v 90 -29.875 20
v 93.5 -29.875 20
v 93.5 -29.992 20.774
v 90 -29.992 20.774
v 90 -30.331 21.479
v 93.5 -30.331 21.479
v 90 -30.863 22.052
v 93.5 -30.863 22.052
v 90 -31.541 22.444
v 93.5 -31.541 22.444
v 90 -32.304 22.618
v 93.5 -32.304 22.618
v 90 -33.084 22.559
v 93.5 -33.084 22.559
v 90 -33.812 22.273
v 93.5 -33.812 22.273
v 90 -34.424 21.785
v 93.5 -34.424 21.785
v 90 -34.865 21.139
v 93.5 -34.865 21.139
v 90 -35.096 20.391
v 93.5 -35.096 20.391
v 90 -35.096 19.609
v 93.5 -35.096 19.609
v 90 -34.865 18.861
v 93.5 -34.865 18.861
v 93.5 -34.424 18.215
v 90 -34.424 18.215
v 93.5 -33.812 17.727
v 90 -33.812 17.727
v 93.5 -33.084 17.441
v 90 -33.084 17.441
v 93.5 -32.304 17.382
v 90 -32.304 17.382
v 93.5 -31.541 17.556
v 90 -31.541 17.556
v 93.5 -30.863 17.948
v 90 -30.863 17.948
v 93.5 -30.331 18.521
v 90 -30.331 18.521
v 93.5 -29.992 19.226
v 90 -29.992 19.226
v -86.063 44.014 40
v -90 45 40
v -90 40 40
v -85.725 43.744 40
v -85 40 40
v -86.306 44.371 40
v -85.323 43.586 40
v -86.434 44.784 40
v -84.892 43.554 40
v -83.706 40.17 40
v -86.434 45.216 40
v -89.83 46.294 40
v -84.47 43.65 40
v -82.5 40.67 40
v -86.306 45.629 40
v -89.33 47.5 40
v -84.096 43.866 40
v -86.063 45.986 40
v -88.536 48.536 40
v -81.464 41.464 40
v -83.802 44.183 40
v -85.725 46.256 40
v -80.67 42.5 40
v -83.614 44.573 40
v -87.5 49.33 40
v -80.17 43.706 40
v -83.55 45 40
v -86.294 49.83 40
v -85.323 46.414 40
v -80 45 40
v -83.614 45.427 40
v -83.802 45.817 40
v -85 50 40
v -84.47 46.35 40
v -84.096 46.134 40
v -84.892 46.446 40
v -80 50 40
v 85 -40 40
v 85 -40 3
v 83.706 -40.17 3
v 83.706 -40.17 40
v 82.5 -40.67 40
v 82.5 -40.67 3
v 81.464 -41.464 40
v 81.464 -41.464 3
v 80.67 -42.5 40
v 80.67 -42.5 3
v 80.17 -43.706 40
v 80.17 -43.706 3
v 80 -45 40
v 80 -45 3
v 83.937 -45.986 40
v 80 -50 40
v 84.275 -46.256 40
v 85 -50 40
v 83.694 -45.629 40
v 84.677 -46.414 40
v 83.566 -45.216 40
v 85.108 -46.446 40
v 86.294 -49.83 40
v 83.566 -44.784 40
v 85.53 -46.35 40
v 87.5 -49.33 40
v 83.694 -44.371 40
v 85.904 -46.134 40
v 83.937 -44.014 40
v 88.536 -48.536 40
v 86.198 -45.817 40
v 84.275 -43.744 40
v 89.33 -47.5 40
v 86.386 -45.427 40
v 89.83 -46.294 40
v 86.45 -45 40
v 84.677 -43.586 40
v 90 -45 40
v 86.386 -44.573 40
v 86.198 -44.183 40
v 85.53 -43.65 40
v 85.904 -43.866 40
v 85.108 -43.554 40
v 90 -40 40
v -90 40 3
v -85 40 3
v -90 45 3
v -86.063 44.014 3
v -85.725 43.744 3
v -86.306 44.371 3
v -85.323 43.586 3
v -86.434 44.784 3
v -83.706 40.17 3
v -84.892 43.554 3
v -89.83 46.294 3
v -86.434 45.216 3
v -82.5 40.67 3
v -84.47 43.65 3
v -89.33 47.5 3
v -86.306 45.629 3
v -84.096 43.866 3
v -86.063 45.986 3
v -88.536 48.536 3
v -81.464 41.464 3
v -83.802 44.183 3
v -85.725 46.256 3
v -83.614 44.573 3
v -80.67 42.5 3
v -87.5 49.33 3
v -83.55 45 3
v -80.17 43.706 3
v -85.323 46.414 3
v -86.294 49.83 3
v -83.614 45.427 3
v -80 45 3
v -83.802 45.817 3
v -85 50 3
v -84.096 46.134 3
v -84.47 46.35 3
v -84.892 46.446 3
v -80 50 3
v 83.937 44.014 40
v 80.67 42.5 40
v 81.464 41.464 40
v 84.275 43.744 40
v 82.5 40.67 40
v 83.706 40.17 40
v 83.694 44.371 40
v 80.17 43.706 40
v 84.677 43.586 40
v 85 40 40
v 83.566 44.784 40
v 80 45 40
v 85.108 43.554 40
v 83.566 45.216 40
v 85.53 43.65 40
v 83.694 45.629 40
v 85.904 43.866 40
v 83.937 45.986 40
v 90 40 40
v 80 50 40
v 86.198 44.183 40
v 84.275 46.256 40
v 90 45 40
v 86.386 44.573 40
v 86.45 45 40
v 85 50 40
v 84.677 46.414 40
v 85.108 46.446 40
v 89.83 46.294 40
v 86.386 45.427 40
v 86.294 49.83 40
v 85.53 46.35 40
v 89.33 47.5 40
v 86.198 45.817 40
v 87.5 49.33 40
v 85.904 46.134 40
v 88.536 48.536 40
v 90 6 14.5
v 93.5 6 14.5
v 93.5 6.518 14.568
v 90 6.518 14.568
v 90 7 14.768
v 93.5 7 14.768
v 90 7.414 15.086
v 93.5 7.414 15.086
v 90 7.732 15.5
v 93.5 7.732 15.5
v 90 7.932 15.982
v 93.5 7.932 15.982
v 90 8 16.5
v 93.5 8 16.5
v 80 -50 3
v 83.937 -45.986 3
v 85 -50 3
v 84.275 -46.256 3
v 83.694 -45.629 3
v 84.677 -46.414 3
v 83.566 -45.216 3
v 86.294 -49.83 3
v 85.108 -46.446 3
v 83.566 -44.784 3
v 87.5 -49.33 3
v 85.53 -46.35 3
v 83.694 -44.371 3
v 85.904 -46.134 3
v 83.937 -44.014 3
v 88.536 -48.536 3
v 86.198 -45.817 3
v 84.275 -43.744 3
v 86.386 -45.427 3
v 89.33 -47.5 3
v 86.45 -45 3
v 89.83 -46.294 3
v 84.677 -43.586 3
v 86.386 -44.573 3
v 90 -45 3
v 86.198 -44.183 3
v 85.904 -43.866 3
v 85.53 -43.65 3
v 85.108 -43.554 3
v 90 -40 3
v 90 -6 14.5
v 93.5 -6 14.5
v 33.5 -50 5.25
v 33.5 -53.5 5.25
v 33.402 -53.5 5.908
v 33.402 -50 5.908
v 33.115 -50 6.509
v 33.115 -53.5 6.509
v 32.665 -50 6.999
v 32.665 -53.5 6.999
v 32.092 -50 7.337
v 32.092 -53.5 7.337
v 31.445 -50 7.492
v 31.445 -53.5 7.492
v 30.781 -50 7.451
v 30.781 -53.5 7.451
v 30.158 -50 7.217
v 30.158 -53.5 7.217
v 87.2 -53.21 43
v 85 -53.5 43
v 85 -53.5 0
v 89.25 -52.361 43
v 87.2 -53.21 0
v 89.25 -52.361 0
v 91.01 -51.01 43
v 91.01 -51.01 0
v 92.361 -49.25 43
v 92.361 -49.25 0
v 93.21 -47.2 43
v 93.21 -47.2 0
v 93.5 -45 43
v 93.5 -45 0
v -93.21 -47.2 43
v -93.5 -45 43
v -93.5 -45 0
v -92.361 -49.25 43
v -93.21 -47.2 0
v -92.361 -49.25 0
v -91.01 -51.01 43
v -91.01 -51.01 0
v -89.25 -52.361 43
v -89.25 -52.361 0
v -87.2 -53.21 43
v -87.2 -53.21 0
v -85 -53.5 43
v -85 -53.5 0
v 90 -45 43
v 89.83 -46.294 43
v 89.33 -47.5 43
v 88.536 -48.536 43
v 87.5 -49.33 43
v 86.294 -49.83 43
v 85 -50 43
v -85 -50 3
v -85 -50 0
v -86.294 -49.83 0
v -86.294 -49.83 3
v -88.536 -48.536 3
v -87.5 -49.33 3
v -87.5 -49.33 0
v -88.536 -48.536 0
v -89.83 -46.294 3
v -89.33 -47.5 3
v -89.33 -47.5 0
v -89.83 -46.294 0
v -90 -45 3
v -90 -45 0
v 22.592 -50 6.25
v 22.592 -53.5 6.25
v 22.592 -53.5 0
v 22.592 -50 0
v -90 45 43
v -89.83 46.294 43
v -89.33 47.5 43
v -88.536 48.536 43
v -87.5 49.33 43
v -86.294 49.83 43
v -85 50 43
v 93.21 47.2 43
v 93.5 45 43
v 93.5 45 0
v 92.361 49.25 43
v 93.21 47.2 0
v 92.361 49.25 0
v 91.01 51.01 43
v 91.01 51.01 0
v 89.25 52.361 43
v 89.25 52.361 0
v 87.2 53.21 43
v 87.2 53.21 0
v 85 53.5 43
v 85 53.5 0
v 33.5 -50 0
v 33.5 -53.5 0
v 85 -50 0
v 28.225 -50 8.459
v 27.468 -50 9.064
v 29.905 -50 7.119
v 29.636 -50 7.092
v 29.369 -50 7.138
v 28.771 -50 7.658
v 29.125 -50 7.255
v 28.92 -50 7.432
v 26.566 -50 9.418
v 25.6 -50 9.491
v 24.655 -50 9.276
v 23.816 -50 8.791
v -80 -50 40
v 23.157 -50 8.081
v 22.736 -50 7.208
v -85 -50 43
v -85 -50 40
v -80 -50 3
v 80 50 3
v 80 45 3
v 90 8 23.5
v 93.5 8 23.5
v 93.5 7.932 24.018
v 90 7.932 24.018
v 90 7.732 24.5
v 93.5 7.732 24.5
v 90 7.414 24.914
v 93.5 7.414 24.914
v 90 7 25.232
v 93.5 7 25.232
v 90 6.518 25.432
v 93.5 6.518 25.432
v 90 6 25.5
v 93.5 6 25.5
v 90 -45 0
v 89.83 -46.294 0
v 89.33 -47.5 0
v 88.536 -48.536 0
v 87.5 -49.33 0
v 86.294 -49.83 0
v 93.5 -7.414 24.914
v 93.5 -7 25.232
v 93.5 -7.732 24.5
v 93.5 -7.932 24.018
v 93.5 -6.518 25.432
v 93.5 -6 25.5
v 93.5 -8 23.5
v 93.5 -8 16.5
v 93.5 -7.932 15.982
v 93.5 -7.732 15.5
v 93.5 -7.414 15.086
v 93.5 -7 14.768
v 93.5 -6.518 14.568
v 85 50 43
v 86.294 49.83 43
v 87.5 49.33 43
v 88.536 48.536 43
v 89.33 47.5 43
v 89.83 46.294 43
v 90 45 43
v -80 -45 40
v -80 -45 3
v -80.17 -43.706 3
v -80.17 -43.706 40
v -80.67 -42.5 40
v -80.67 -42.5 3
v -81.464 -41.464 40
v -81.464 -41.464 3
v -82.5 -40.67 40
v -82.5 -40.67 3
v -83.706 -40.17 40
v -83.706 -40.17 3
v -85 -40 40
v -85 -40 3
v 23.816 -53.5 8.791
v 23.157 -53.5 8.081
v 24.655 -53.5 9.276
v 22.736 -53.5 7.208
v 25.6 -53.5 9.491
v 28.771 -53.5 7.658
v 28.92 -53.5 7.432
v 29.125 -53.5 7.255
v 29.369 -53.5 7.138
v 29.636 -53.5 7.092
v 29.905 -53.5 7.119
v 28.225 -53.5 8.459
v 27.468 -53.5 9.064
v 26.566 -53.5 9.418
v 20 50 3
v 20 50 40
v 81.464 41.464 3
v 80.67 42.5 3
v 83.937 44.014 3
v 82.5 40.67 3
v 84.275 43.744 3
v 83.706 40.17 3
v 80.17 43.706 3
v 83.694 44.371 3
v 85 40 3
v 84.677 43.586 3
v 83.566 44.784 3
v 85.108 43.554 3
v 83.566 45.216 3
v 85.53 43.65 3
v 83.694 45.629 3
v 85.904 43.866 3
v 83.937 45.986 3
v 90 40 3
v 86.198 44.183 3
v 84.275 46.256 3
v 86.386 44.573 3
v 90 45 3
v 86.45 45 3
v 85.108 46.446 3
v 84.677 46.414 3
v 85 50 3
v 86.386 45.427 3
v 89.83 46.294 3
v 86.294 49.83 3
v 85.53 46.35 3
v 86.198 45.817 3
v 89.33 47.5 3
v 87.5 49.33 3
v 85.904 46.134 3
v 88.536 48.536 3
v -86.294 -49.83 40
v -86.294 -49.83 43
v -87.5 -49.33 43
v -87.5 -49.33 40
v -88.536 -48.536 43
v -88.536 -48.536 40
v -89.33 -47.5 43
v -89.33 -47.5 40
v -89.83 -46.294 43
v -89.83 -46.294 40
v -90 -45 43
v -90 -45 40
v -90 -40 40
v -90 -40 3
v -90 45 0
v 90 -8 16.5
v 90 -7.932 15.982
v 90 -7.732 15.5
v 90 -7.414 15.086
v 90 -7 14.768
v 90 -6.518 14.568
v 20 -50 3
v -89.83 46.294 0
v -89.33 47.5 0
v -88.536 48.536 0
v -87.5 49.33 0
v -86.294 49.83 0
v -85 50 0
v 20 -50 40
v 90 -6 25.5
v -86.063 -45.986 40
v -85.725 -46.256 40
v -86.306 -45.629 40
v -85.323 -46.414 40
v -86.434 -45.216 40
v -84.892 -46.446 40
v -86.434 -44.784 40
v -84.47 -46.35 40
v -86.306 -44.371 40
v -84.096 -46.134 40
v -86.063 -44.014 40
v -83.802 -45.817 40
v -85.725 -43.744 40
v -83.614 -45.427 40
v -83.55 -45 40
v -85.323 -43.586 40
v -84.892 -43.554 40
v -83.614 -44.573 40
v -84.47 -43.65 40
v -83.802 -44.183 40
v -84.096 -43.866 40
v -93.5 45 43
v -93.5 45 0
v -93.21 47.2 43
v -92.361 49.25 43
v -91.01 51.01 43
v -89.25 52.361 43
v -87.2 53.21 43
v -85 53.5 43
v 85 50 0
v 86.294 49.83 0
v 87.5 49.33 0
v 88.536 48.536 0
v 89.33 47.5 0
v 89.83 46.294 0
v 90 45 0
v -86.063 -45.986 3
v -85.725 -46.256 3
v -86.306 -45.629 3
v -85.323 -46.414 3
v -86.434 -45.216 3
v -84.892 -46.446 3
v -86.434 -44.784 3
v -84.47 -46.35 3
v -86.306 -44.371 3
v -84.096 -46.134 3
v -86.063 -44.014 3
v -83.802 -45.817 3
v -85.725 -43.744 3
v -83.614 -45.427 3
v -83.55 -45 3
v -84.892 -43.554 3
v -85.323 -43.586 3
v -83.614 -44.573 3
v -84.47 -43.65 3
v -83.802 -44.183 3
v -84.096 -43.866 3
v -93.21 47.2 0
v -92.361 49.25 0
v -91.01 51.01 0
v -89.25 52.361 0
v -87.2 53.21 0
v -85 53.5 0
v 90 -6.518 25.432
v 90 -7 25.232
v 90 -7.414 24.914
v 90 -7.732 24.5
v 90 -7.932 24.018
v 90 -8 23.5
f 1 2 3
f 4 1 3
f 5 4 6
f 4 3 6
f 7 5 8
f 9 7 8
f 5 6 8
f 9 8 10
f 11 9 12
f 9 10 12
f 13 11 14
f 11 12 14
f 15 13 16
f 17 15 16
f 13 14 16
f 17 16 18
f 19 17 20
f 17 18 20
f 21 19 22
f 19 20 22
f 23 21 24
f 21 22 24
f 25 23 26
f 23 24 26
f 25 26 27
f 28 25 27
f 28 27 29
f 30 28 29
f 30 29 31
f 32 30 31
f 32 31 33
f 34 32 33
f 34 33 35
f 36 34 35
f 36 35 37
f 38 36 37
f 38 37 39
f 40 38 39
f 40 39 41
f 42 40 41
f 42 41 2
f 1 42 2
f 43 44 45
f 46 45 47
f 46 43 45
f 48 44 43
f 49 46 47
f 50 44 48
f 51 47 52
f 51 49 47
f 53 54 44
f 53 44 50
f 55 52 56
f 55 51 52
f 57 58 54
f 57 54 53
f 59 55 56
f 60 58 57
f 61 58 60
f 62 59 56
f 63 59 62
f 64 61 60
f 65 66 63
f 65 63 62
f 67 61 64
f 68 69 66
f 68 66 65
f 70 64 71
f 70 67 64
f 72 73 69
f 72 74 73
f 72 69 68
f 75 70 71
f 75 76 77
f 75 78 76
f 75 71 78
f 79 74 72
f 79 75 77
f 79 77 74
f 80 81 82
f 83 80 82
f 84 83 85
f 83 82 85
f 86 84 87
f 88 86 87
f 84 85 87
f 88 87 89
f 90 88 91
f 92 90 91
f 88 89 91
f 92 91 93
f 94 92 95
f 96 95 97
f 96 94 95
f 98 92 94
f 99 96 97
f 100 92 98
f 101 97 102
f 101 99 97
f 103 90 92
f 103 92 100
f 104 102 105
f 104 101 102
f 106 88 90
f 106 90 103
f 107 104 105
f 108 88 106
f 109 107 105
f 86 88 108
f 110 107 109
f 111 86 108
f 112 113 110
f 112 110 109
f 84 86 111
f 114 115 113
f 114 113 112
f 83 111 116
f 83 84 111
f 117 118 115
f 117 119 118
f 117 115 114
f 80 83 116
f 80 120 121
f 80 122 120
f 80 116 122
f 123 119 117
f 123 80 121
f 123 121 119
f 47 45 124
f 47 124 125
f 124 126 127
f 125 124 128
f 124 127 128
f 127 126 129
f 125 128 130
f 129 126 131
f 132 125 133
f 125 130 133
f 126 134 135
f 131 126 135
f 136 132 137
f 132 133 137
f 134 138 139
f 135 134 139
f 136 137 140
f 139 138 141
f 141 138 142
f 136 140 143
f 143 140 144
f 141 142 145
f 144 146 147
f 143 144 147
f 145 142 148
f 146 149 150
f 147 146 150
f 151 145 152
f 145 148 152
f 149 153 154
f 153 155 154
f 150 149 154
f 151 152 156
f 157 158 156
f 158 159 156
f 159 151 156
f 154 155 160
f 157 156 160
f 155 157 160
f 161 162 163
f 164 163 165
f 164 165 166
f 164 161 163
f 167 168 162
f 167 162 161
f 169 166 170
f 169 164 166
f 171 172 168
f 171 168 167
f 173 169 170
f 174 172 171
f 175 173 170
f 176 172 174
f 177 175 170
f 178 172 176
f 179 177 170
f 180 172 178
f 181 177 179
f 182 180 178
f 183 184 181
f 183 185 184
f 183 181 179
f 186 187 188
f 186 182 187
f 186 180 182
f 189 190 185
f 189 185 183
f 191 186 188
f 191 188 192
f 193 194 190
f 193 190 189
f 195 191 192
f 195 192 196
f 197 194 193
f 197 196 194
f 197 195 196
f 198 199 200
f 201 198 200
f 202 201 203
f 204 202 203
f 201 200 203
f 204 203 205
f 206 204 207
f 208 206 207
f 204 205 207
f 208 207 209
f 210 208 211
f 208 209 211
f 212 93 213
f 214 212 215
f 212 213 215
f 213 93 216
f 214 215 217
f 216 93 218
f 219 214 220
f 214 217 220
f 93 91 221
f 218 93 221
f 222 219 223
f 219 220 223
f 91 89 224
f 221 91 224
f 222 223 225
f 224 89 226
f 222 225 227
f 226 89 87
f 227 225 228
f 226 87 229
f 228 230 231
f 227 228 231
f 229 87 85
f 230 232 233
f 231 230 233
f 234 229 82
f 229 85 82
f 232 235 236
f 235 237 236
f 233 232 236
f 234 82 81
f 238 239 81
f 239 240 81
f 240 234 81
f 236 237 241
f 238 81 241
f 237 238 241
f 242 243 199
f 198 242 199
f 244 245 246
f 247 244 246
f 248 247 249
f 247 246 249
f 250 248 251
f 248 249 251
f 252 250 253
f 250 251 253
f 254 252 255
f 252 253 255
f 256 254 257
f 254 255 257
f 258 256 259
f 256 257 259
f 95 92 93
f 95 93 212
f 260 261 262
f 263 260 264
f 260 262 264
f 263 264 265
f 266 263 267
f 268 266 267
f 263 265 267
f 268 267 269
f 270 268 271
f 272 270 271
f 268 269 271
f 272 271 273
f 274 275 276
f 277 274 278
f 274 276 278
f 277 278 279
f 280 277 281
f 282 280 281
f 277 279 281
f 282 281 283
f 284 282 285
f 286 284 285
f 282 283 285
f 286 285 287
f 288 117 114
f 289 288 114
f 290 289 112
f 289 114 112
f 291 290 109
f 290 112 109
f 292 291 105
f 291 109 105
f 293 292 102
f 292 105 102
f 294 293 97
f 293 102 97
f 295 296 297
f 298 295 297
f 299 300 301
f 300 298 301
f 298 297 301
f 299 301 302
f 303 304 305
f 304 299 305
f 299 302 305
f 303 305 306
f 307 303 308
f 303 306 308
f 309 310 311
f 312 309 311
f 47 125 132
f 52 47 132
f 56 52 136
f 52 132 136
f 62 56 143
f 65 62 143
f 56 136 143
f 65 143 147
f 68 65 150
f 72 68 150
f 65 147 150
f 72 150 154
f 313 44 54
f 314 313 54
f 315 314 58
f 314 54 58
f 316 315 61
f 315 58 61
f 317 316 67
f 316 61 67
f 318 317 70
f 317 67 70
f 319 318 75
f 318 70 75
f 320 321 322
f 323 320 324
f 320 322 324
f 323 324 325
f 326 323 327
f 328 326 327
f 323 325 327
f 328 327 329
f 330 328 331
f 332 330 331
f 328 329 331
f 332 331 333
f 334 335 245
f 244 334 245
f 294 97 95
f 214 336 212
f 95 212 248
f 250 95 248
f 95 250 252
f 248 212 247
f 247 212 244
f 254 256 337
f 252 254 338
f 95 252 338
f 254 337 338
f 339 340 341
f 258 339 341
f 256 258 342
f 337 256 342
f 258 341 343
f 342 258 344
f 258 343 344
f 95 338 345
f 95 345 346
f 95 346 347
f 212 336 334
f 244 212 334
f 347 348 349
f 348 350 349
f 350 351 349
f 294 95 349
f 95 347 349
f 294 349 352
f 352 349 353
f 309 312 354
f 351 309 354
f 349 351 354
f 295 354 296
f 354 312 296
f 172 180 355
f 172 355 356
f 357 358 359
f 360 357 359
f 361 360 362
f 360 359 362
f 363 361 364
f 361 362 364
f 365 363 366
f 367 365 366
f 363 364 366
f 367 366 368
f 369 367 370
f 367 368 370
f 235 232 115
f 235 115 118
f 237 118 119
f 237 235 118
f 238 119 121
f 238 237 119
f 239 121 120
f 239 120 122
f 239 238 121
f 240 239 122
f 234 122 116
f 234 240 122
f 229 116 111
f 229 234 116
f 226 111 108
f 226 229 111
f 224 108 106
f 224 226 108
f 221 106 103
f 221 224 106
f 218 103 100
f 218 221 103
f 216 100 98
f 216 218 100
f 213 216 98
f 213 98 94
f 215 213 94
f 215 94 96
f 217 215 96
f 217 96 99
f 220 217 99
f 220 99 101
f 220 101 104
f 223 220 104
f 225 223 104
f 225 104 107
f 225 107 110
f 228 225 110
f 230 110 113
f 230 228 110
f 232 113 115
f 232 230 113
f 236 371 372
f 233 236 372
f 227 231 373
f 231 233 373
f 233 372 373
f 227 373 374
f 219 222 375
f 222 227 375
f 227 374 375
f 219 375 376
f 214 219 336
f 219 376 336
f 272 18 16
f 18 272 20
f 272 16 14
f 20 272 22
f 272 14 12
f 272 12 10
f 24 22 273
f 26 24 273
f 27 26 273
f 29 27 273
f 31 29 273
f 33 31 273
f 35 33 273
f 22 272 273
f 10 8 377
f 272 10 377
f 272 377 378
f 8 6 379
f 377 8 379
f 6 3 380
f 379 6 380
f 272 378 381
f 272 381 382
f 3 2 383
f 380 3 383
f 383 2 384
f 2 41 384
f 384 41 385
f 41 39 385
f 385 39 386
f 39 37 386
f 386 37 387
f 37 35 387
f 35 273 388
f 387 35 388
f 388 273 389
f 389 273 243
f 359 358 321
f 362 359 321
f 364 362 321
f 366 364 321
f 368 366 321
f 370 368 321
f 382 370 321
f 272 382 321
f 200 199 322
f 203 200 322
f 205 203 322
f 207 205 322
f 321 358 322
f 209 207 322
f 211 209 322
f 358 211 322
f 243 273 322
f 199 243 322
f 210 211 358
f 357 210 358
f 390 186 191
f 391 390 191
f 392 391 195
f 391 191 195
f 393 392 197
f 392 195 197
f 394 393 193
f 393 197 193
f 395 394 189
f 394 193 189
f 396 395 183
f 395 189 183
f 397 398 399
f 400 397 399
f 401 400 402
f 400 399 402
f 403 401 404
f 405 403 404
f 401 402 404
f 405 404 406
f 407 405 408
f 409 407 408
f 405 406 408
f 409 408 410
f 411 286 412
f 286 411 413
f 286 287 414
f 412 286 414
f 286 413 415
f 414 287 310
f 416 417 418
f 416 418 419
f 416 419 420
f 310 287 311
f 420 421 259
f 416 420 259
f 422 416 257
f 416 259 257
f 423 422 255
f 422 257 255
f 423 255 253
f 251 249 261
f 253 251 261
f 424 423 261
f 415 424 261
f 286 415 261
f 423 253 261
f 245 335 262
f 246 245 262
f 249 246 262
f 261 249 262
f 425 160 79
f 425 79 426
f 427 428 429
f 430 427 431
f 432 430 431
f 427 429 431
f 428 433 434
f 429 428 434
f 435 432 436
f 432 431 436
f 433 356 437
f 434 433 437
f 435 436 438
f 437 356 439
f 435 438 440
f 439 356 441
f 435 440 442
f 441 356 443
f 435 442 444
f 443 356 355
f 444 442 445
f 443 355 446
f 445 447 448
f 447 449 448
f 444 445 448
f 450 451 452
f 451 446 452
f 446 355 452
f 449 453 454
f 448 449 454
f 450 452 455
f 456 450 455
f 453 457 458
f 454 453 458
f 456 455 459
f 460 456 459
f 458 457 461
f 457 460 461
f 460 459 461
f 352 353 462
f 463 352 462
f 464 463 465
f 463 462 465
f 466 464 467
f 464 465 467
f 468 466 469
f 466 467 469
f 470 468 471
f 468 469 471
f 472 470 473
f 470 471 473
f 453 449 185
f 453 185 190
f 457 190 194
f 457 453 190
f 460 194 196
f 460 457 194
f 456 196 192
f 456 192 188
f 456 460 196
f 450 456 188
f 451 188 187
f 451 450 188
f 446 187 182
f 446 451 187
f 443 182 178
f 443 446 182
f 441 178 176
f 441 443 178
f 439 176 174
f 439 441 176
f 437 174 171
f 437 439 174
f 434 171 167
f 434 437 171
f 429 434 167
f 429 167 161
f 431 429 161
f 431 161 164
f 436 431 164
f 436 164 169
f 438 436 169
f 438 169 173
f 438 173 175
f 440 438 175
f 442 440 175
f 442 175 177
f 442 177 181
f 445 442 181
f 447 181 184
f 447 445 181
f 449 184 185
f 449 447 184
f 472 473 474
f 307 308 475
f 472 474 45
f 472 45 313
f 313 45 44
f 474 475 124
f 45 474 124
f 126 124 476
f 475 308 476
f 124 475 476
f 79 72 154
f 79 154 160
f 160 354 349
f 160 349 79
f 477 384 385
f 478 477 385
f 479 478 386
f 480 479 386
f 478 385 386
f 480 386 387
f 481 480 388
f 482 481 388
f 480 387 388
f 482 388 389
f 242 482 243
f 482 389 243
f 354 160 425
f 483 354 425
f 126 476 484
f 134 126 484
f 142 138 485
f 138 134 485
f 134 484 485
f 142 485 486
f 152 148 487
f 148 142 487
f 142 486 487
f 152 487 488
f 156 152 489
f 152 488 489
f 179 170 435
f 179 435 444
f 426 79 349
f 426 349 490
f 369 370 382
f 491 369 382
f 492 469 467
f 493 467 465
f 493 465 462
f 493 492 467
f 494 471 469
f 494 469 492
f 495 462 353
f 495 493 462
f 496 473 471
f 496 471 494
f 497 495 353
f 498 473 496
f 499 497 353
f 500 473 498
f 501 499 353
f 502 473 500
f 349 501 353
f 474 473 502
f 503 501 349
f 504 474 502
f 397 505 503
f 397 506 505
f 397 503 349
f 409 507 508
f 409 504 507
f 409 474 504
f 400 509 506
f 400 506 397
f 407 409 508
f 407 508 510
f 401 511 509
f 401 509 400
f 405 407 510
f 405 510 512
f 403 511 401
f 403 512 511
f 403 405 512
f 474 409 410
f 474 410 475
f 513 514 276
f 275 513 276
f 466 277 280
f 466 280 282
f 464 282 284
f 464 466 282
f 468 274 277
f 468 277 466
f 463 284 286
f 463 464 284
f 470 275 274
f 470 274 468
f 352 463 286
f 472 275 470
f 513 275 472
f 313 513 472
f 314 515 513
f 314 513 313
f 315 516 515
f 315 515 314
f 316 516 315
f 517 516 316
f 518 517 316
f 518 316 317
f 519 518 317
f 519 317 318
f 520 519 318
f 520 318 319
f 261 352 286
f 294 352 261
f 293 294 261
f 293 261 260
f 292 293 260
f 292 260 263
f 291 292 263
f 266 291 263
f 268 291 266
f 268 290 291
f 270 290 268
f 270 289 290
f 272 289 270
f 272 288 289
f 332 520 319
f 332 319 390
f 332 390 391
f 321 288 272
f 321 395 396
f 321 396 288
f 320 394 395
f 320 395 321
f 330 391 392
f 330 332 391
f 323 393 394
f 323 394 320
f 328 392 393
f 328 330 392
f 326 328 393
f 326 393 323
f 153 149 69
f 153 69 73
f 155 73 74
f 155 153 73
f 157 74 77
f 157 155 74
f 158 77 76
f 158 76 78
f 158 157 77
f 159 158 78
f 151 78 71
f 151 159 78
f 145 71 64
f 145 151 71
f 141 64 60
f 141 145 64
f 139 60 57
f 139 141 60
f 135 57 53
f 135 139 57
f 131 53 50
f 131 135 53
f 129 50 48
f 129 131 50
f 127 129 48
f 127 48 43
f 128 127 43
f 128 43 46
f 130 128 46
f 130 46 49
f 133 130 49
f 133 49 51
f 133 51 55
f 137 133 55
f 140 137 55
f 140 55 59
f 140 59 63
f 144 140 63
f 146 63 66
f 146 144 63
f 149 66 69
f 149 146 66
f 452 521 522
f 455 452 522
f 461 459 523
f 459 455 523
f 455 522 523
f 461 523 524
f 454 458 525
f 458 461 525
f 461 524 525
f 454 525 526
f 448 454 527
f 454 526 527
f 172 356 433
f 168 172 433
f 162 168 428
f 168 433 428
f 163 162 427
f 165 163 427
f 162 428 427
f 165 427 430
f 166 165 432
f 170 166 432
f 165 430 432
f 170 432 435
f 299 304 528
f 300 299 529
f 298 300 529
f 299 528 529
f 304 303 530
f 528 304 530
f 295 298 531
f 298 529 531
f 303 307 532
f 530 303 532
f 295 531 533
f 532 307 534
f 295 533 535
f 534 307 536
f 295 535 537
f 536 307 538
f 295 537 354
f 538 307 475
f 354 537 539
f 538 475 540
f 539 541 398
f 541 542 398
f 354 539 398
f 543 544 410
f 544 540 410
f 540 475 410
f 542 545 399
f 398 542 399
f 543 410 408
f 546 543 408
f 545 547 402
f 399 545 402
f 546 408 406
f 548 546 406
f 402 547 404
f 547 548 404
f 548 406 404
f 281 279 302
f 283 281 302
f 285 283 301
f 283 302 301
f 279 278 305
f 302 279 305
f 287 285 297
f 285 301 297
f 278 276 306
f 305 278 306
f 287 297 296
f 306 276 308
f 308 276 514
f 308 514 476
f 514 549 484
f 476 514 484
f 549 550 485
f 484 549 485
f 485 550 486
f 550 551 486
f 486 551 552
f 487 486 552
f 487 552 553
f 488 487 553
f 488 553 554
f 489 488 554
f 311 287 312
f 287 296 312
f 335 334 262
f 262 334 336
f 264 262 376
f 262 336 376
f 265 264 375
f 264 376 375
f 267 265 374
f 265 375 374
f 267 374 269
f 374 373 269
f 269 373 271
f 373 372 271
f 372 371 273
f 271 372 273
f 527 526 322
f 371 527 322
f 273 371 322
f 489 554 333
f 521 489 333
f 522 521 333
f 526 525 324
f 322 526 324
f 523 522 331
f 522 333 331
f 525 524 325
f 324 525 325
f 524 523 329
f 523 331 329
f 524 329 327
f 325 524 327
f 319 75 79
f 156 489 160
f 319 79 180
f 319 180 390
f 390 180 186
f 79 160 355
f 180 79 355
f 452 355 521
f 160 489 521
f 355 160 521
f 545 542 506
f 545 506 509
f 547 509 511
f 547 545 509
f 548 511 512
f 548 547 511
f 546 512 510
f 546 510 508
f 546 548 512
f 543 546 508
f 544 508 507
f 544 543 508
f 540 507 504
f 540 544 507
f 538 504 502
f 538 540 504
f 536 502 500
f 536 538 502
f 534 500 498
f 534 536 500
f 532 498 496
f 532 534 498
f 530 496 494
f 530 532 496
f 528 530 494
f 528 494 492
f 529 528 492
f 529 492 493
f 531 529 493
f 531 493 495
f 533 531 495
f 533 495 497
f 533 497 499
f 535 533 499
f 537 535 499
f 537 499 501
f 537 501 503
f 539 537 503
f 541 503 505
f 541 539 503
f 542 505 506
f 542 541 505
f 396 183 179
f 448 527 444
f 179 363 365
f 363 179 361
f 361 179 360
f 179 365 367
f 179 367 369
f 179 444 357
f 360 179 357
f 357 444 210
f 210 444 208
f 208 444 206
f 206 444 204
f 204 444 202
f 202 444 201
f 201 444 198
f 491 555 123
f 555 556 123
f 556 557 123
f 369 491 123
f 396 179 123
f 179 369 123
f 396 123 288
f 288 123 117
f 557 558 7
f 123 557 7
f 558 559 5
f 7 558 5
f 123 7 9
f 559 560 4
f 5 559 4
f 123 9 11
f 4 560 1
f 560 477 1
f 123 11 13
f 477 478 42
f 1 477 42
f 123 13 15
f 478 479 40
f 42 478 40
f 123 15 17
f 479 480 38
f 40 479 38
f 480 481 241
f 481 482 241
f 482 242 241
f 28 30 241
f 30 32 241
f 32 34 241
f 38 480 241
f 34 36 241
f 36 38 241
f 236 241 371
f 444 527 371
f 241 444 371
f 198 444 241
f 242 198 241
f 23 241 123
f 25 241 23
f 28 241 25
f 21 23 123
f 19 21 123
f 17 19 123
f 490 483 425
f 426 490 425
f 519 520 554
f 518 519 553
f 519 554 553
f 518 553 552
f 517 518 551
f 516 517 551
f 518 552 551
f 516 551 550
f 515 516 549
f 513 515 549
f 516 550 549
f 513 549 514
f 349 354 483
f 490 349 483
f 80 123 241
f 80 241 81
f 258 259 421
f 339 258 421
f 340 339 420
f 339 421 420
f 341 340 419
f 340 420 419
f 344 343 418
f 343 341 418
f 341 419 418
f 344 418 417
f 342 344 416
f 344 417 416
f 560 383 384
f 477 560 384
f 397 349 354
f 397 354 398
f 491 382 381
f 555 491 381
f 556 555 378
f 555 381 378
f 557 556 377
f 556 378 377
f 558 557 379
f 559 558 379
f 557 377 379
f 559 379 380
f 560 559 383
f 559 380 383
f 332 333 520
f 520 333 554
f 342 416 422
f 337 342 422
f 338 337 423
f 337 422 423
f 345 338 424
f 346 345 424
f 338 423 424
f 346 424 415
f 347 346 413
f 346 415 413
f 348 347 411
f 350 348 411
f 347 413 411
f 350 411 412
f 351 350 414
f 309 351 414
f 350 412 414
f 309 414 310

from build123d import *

# Parameters (mm, degrees)
F1_DEPTH  = 43
F3_R      = 1.45
F4_DEPTH  = 37
F5_R      = 2.625
F6_DEPTH  = 10
F7_W      = 100
F7_H      = 100
F8_DEPTH  = 37
F11_DEPTH = 25


with BuildPart() as f1:
    # F0 (on Top) → F1 (new body)
    with BuildSketch(Plane.XY):
        with BuildLine():
            Line((93.5, -45), (93.5, 45))
            ThreePointArc((93.5, 45), (91.010408, 51.010408), (85, 53.5))
            Line((85, 53.5), (-85, 53.5))
            ThreePointArc((-85, 53.5), (-91.010408, 51.010408), (-93.5, 45))
            Line((-93.5, 45), (-93.5, -45))
            ThreePointArc((-93.5, -45), (-91.010408, -51.010408), (-85, -53.5))
            Line((-85, -53.5), (85, -53.5))
            ThreePointArc((85, -53.5), (91.010408, -51.010408), (93.5, -45))
        make_face()
        with BuildLine():
            ThreePointArc((-90, 45), (-88.535534, 48.535534), (-85, 50))
            Line((-85, 50), (85, 50))
            ThreePointArc((85, 50), (88.535534, 48.535534), (90, 45))
            Line((90, 45), (90, -45))
            ThreePointArc((90, -45), (88.535534, -48.535534), (85, -50))
            Line((85, -50), (-85, -50))
            ThreePointArc((-85, -50), (-88.535534, -48.535534), (-90, -45))
            Line((-90, -45), (-90, 45))
        make_face(mode=Mode.SUBTRACT)
    extrude(amount=F1_DEPTH)

    # F3 (on offset) → F4 (join)
    with BuildSketch(Plane.XY.offset(3)):
        with BuildLine():
            Line((-80, 45), (-80, 50))
            Line((-80, 50), (-85, 50))
            ThreePointArc((-85, 50), (-88.535534, 48.535534), (-90, 45))
            Line((-90, 45), (-90, 40))
            Line((-90, 40), (-85, 40))
            ThreePointArc((-85, 40), (-81.464466, 41.464466), (-80, 45))
        make_face()
        with Locations((-85, 45)):
            Circle(F3_R, mode=Mode.SUBTRACT)
        with BuildLine():
            ThreePointArc((90, 45), (88.535534, 48.535534), (85, 50))
            Line((85, 50), (80, 50))
            Line((80, 50), (80, 45))
            ThreePointArc((80, 45), (81.464466, 41.464466), (85, 40))
            Line((85, 40), (90, 40))
            Line((90, 40), (90, 45))
        make_face()
        with Locations((85, 45)):
            Circle(F3_R, mode=Mode.SUBTRACT)
        with BuildLine():
            Line((80, -45), (80, -50))
            Line((80, -50), (85, -50))
            ThreePointArc((85, -50), (88.535534, -48.535534), (90, -45))
            Line((90, -45), (90, -40))
            Line((90, -40), (85, -40))
            ThreePointArc((85, -40), (81.464466, -41.464466), (80, -45))
        make_face()
        with Locations((85, -45)):
            Circle(F3_R, mode=Mode.SUBTRACT)
        with BuildLine():
            ThreePointArc((-80, -45), (-81.464466, -41.464466), (-85, -40))
            Line((-85, -40), (-90, -40))
            Line((-90, -40), (-90, -45))
            ThreePointArc((-90, -45), (-88.535534, -48.535534), (-85, -50))
            Line((-85, -50), (-80, -50))
            Line((-80, -50), (-80, -45))
        make_face()
        with Locations((-85, -45)):
            Circle(F3_R, mode=Mode.SUBTRACT)
    extrude(amount=F4_DEPTH)

    # F5 (on face) → F6 (cut)
    with BuildSketch(Plane.YZ.offset(93.5)):
        with BuildLine():
            Line((-6, 14.5), (6, 14.5))
            ThreePointArc((6, 14.5), (7.414214, 15.085786), (8, 16.5))
            Line((8, 16.5), (8, 23.5))
            ThreePointArc((8, 23.5), (7.414214, 24.914214), (6, 25.5))
            Line((6, 25.5), (-6, 25.5))
            ThreePointArc((-6, 25.5), (-7.414214, 24.914214), (-8, 23.5))
            Line((-8, 23.5), (-8, 16.5))
            ThreePointArc((-8, 16.5), (-7.414214, 15.085786), (-6, 14.5))
        make_face()
        with Locations((-32.5, 20)):
            Circle(F5_R)
    extrude(amount=-F6_DEPTH, mode=Mode.SUBTRACT)

    # F10 (on face) → F11 (cut)
    with BuildSketch(Plane.XZ.offset(53.5)):
        with BuildLine():
            ThreePointArc((30.157615, 7.217027), (29.369065, 7.138285), (28.770832, 7.658024))
            ThreePointArc((28.770832, 7.658024), (25.119615, 9.418775), (22.591673, 6.25))
            Line((22.591673, 6.25), (22.591673, 0))
            Line((22.591673, 0), (33.5, 0))
            Line((33.5, 0), (33.5, 5.25))
            ThreePointArc((33.5, 5.25), (32.391191, 7.189119), (30.157615, 7.217027))
        make_face()
    extrude(amount=-F11_DEPTH, mode=Mode.SUBTRACT)


with BuildPart() as f8:
    # F7 (on offset) → F8 (new body)
    with BuildSketch(Plane.XY.offset(3)):
        with Locations((-30, 0)):
            Rectangle(F7_W, F7_H)
    extrude(amount=F8_DEPTH)


solid = Compound([f1.part, f8.part])
